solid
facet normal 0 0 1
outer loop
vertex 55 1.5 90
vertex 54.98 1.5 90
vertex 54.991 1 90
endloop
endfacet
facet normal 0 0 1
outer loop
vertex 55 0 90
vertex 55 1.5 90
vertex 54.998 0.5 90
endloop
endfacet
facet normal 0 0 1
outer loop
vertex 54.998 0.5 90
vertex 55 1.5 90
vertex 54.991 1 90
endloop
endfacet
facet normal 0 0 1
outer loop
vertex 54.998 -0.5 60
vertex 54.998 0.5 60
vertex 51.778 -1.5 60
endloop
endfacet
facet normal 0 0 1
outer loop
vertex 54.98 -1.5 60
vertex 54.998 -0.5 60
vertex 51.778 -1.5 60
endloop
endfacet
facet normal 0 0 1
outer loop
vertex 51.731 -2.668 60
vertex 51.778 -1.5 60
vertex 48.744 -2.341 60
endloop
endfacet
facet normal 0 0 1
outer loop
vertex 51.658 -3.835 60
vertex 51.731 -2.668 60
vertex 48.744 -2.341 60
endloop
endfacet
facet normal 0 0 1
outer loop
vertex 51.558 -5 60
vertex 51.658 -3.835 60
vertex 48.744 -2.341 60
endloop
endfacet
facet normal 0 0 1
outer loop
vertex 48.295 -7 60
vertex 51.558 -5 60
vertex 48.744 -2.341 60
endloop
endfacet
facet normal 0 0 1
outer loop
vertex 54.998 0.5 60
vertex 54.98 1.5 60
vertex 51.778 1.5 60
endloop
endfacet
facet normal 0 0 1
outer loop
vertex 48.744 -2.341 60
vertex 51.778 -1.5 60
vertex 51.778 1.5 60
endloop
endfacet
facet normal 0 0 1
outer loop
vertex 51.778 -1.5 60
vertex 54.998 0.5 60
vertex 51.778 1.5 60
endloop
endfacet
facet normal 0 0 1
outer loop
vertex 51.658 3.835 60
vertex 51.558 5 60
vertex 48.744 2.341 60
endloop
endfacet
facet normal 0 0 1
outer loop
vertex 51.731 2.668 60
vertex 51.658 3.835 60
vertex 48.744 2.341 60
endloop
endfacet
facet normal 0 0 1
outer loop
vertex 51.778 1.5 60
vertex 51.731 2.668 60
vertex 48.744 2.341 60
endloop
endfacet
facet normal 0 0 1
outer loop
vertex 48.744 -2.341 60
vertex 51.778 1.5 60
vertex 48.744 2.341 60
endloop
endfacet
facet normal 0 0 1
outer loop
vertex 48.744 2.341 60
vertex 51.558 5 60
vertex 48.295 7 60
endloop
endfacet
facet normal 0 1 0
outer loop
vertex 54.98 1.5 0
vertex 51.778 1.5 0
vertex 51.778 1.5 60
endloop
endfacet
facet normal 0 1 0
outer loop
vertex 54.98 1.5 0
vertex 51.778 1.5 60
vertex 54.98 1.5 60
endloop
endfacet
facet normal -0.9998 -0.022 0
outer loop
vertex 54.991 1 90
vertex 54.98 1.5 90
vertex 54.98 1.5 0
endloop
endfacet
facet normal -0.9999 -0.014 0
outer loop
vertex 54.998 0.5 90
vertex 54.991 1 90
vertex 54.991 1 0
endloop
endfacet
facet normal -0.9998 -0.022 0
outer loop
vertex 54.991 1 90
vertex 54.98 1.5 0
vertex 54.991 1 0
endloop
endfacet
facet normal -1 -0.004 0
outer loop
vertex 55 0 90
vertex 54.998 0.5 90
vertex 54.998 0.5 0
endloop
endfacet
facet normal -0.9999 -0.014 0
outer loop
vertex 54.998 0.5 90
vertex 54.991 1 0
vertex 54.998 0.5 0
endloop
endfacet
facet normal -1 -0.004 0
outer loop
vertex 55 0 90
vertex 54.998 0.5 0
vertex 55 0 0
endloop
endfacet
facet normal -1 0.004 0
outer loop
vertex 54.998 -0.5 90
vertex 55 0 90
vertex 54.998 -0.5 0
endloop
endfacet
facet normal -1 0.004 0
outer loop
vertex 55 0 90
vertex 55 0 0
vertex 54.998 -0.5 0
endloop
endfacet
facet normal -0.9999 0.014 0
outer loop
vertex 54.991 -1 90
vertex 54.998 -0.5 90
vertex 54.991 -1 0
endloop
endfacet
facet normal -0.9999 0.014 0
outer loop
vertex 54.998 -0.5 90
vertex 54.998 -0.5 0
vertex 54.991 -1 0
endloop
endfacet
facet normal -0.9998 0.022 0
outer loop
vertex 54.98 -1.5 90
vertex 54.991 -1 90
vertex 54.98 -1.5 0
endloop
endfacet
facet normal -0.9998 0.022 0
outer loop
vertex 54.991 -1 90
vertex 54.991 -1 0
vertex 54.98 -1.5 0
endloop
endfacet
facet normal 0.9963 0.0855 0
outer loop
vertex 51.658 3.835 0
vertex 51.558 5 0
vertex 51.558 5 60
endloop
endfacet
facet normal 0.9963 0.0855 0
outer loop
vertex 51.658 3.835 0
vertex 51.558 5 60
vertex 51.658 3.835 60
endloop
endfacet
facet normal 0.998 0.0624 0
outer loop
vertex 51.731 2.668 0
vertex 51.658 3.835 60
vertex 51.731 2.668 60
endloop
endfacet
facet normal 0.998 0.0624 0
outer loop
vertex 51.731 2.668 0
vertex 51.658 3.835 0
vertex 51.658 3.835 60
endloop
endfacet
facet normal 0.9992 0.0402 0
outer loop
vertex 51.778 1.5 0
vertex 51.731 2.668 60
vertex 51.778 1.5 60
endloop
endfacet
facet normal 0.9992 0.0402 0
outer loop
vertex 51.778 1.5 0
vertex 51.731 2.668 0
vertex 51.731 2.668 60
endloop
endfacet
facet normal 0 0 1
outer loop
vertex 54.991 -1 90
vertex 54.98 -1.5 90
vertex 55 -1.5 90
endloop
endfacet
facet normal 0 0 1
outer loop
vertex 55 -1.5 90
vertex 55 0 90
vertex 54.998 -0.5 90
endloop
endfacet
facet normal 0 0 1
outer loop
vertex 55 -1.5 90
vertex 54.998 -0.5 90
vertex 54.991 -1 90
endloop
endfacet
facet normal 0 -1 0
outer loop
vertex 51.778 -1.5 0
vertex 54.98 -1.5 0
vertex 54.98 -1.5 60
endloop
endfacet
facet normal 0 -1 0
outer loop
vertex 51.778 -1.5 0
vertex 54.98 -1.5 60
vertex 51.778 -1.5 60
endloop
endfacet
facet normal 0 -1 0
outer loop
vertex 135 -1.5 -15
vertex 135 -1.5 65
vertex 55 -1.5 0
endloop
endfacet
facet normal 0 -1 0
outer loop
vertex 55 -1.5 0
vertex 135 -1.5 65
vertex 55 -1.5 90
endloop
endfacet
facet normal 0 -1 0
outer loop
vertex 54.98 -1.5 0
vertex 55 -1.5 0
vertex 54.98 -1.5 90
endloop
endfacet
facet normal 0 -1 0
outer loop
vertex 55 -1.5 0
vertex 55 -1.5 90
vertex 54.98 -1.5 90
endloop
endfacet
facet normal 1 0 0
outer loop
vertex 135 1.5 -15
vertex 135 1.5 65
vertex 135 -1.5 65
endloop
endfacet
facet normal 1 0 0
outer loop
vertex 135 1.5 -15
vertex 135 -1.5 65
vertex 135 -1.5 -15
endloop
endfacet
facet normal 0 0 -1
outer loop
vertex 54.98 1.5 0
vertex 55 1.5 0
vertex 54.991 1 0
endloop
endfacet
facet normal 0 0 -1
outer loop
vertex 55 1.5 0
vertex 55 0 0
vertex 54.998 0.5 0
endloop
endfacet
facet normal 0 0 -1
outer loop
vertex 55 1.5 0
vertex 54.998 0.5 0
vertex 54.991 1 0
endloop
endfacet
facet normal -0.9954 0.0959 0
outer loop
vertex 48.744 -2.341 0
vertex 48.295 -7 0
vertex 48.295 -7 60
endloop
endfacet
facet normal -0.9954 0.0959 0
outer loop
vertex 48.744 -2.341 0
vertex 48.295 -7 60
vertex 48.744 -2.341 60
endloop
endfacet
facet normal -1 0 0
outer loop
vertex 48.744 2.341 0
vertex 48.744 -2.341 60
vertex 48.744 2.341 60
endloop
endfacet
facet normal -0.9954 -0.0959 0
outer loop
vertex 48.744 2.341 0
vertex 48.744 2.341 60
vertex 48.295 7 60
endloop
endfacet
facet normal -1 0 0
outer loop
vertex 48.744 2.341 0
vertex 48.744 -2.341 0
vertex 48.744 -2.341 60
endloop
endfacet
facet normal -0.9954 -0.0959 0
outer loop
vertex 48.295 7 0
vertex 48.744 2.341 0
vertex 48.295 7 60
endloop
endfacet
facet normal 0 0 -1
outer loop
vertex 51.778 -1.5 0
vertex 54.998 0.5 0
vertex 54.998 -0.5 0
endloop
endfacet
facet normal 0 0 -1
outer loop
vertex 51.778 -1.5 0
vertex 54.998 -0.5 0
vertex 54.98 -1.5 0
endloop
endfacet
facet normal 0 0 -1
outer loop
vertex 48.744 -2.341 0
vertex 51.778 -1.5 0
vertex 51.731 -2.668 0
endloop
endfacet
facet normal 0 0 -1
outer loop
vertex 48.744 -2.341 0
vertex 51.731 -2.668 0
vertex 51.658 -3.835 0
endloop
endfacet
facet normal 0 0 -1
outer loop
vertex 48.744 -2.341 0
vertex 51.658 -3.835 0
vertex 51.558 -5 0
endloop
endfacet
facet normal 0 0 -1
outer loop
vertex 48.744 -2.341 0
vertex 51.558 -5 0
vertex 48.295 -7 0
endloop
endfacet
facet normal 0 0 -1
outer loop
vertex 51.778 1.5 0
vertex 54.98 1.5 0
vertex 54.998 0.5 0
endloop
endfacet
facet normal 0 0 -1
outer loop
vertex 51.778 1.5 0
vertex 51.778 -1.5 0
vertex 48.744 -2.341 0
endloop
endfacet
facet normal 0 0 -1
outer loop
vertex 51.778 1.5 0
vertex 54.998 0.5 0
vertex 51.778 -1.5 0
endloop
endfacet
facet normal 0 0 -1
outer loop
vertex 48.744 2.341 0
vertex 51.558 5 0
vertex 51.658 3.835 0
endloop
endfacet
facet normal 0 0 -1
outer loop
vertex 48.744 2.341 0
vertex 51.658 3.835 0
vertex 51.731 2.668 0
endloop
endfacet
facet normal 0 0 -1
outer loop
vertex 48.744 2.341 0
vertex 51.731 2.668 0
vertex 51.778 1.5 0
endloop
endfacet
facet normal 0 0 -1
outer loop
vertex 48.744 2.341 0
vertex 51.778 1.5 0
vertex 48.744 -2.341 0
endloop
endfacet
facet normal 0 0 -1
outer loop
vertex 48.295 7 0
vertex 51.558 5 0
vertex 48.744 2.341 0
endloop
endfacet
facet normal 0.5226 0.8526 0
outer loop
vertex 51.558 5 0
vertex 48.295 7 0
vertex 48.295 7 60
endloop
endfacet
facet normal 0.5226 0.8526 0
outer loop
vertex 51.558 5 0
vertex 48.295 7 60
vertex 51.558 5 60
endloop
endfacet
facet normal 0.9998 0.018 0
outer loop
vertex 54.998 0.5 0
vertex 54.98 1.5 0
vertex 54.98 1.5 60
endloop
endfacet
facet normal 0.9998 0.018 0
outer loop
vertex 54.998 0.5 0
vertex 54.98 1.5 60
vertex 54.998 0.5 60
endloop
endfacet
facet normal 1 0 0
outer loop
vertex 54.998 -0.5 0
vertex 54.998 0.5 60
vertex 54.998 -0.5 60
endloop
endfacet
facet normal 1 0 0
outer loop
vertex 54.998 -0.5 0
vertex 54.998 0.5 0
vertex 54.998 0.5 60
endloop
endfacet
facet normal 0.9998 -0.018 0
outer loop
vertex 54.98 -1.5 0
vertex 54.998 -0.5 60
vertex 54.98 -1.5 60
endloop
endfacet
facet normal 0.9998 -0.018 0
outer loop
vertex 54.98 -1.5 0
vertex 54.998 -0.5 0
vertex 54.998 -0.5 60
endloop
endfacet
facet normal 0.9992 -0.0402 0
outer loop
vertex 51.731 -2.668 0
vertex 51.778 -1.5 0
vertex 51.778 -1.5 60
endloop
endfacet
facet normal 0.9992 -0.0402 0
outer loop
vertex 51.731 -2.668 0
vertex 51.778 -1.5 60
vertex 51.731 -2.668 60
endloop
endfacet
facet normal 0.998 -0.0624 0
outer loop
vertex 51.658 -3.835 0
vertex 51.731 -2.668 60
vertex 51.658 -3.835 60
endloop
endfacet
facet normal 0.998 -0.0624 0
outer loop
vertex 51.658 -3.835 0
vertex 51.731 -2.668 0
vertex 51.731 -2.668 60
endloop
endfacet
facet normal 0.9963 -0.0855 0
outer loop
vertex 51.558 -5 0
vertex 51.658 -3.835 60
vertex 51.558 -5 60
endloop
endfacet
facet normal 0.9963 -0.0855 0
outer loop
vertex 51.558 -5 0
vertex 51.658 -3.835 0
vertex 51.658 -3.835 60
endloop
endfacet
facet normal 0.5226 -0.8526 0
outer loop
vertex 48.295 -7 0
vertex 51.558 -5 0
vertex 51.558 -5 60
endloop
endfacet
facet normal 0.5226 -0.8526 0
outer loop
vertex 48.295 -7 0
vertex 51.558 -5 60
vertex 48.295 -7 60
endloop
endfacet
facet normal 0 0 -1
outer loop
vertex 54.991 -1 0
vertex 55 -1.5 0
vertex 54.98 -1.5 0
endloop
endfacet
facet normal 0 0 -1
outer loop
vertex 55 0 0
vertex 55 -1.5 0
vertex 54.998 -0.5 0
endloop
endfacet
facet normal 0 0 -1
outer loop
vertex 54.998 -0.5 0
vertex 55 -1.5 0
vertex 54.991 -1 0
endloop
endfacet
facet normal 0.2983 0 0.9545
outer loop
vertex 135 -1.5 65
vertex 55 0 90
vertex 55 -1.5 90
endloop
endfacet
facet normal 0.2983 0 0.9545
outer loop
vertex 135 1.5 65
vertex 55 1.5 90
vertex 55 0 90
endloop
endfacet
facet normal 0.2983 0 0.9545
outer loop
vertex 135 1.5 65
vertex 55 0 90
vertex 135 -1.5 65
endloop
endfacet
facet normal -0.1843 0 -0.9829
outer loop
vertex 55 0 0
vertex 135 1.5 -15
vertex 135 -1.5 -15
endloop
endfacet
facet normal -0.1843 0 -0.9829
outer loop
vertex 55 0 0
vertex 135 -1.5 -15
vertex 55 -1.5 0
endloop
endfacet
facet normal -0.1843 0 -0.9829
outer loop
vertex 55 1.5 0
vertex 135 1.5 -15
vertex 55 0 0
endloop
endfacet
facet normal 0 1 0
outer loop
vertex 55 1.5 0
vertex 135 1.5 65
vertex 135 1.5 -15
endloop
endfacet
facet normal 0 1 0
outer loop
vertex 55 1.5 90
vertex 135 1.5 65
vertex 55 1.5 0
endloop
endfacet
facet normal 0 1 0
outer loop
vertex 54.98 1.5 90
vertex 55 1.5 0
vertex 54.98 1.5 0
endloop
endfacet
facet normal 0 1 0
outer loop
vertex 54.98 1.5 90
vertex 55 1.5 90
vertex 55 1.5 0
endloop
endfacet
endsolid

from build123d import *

# Parameters (mm, degrees)
SKETCH_1_R          = 55
EXTRUDE_1_DEPTH     = 190
SKETCH_2_R          = 51.8
CUT_EXTRUDE_1_DEPTH = 186.8
SKETCH_3_R          = 15
CUT_EXTRUDE_2_DEPTH = 10
SKETCH_4_R          = 18.2
SKETCH_4_R_2        = 15
EXTRUDE_2_DEPTH     = 188
SKETCH_5_R          = 55
EXTRUDE_5_DEPTH     = 3.2
EXTRUDE_6_DEPTH     = 1.5
CUT_EXTRUDE_START   = -300
CUT_EXTRUDE_3_DEPTH = 300
EXTRUDE_7_DEPTH     = 60


with BuildPart() as part:
    # 草图1 → 凸台-拉伸1 (new body)
    with BuildSketch(Plane.XY):
        Circle(SKETCH_1_R)
    extrude(amount=EXTRUDE_1_DEPTH)

    # 草图2 → 切除-拉伸1 (cut)
    with BuildSketch(Plane.XY.offset(190)):
        Circle(SKETCH_2_R)
    extrude(amount=-CUT_EXTRUDE_1_DEPTH, mode=Mode.SUBTRACT)

    # 草图3 → 切除-拉伸2 (cut)
    with BuildSketch(Plane(origin=(0, 0, 0), x_dir=(-1, 0, 0), z_dir=(0, 0, -1))):
        Circle(SKETCH_3_R)
    extrude(amount=-CUT_EXTRUDE_2_DEPTH, mode=Mode.SUBTRACT)

    # 草图4 → 凸台-拉伸2 (add)
    with BuildSketch(Plane.XY.offset(3.2)):
        Circle(SKETCH_4_R)
        with Locations(Location((0, 0, 0), (0, 0, 180))):
            Circle(SKETCH_4_R_2, mode=Mode.SUBTRACT)
    extrude(amount=EXTRUDE_2_DEPTH)

    # 草图5 → 凸台-拉伸5 (add)
    with BuildSketch(Plane.XY.offset(190)):
        Circle(SKETCH_5_R)
    extrude(amount=EXTRUDE_5_DEPTH)

    # 草图8 → 凸台-拉伸6 (add, symmetric)
    with BuildSketch(Plane(origin=(0, 0, 0), x_dir=(-1, 0, 0), z_dir=(0, 1, 0))):
        Polygon((-55, 90), (-135, 65), (-135, -15), (-55, 0), (-53, 0), (-53, 90), align=None)
    extrude(amount=EXTRUDE_6_DEPTH, both=True)

    # 草图9 → 切除-拉伸3 (cut)
    with BuildSketch(Plane.XY.offset(193.2).offset(CUT_EXTRUDE_START)):
        with BuildLine():
            Line((24.339487832, -49.321286805), (24.339487832, -150.159347116))
            Line((24.339487832, -150.159347116), (-116.243890066, -150.159347116))
            Line((-116.243890066, -150.159347116), (-116.243890066, 159.53157231))
            Line((-116.243890066, 159.53157231), (24.339487832, 159.53157231))
            Line((24.339487832, 159.53157231), (24.339487832, 49.321286805))
            ThreePointArc((24.339487832, 49.321286805), (55, 0), (24.339487832, -49.321286805))
        make_face()
    extrude(amount=CUT_EXTRUDE_3_DEPTH, mode=Mode.SUBTRACT)


with BuildPart() as body_2:
    # 草图10 → 凸台-拉伸7 (new body)
    with BuildSketch(Plane(origin=(55, 0, 0), x_dir=(1, 0, 0), z_dir=(0, 0, 1))):
        with BuildLine():
            Line((-3.221722702, 1.5), (-0.02045835, 1.5))
            ThreePointArc((-0.02045835, 1.5), (0, 0), (-0.02045835, -1.5))
            Line((-0.02045835, -1.5), (-3.221722702, -1.5))
            ThreePointArc((-3.221722702, -1.5), (-3.302172357, -3.251863624), (-3.441877459, -5))
            Line((-3.441877459, -5), (-6.70465861, -7))
            ThreePointArc((-6.70465861, -7), (-6.2, 0), (-6.70465861, 7))
            Line((-6.70465861, 7), (-3.441877459, 5))
            ThreePointArc((-3.441877459, 5), (-3.302172357, 3.251863624), (-3.221722702, 1.5))
        make_face()
    extrude(amount=EXTRUDE_7_DEPTH)


solid = Compound([part.part, body_2.part])
